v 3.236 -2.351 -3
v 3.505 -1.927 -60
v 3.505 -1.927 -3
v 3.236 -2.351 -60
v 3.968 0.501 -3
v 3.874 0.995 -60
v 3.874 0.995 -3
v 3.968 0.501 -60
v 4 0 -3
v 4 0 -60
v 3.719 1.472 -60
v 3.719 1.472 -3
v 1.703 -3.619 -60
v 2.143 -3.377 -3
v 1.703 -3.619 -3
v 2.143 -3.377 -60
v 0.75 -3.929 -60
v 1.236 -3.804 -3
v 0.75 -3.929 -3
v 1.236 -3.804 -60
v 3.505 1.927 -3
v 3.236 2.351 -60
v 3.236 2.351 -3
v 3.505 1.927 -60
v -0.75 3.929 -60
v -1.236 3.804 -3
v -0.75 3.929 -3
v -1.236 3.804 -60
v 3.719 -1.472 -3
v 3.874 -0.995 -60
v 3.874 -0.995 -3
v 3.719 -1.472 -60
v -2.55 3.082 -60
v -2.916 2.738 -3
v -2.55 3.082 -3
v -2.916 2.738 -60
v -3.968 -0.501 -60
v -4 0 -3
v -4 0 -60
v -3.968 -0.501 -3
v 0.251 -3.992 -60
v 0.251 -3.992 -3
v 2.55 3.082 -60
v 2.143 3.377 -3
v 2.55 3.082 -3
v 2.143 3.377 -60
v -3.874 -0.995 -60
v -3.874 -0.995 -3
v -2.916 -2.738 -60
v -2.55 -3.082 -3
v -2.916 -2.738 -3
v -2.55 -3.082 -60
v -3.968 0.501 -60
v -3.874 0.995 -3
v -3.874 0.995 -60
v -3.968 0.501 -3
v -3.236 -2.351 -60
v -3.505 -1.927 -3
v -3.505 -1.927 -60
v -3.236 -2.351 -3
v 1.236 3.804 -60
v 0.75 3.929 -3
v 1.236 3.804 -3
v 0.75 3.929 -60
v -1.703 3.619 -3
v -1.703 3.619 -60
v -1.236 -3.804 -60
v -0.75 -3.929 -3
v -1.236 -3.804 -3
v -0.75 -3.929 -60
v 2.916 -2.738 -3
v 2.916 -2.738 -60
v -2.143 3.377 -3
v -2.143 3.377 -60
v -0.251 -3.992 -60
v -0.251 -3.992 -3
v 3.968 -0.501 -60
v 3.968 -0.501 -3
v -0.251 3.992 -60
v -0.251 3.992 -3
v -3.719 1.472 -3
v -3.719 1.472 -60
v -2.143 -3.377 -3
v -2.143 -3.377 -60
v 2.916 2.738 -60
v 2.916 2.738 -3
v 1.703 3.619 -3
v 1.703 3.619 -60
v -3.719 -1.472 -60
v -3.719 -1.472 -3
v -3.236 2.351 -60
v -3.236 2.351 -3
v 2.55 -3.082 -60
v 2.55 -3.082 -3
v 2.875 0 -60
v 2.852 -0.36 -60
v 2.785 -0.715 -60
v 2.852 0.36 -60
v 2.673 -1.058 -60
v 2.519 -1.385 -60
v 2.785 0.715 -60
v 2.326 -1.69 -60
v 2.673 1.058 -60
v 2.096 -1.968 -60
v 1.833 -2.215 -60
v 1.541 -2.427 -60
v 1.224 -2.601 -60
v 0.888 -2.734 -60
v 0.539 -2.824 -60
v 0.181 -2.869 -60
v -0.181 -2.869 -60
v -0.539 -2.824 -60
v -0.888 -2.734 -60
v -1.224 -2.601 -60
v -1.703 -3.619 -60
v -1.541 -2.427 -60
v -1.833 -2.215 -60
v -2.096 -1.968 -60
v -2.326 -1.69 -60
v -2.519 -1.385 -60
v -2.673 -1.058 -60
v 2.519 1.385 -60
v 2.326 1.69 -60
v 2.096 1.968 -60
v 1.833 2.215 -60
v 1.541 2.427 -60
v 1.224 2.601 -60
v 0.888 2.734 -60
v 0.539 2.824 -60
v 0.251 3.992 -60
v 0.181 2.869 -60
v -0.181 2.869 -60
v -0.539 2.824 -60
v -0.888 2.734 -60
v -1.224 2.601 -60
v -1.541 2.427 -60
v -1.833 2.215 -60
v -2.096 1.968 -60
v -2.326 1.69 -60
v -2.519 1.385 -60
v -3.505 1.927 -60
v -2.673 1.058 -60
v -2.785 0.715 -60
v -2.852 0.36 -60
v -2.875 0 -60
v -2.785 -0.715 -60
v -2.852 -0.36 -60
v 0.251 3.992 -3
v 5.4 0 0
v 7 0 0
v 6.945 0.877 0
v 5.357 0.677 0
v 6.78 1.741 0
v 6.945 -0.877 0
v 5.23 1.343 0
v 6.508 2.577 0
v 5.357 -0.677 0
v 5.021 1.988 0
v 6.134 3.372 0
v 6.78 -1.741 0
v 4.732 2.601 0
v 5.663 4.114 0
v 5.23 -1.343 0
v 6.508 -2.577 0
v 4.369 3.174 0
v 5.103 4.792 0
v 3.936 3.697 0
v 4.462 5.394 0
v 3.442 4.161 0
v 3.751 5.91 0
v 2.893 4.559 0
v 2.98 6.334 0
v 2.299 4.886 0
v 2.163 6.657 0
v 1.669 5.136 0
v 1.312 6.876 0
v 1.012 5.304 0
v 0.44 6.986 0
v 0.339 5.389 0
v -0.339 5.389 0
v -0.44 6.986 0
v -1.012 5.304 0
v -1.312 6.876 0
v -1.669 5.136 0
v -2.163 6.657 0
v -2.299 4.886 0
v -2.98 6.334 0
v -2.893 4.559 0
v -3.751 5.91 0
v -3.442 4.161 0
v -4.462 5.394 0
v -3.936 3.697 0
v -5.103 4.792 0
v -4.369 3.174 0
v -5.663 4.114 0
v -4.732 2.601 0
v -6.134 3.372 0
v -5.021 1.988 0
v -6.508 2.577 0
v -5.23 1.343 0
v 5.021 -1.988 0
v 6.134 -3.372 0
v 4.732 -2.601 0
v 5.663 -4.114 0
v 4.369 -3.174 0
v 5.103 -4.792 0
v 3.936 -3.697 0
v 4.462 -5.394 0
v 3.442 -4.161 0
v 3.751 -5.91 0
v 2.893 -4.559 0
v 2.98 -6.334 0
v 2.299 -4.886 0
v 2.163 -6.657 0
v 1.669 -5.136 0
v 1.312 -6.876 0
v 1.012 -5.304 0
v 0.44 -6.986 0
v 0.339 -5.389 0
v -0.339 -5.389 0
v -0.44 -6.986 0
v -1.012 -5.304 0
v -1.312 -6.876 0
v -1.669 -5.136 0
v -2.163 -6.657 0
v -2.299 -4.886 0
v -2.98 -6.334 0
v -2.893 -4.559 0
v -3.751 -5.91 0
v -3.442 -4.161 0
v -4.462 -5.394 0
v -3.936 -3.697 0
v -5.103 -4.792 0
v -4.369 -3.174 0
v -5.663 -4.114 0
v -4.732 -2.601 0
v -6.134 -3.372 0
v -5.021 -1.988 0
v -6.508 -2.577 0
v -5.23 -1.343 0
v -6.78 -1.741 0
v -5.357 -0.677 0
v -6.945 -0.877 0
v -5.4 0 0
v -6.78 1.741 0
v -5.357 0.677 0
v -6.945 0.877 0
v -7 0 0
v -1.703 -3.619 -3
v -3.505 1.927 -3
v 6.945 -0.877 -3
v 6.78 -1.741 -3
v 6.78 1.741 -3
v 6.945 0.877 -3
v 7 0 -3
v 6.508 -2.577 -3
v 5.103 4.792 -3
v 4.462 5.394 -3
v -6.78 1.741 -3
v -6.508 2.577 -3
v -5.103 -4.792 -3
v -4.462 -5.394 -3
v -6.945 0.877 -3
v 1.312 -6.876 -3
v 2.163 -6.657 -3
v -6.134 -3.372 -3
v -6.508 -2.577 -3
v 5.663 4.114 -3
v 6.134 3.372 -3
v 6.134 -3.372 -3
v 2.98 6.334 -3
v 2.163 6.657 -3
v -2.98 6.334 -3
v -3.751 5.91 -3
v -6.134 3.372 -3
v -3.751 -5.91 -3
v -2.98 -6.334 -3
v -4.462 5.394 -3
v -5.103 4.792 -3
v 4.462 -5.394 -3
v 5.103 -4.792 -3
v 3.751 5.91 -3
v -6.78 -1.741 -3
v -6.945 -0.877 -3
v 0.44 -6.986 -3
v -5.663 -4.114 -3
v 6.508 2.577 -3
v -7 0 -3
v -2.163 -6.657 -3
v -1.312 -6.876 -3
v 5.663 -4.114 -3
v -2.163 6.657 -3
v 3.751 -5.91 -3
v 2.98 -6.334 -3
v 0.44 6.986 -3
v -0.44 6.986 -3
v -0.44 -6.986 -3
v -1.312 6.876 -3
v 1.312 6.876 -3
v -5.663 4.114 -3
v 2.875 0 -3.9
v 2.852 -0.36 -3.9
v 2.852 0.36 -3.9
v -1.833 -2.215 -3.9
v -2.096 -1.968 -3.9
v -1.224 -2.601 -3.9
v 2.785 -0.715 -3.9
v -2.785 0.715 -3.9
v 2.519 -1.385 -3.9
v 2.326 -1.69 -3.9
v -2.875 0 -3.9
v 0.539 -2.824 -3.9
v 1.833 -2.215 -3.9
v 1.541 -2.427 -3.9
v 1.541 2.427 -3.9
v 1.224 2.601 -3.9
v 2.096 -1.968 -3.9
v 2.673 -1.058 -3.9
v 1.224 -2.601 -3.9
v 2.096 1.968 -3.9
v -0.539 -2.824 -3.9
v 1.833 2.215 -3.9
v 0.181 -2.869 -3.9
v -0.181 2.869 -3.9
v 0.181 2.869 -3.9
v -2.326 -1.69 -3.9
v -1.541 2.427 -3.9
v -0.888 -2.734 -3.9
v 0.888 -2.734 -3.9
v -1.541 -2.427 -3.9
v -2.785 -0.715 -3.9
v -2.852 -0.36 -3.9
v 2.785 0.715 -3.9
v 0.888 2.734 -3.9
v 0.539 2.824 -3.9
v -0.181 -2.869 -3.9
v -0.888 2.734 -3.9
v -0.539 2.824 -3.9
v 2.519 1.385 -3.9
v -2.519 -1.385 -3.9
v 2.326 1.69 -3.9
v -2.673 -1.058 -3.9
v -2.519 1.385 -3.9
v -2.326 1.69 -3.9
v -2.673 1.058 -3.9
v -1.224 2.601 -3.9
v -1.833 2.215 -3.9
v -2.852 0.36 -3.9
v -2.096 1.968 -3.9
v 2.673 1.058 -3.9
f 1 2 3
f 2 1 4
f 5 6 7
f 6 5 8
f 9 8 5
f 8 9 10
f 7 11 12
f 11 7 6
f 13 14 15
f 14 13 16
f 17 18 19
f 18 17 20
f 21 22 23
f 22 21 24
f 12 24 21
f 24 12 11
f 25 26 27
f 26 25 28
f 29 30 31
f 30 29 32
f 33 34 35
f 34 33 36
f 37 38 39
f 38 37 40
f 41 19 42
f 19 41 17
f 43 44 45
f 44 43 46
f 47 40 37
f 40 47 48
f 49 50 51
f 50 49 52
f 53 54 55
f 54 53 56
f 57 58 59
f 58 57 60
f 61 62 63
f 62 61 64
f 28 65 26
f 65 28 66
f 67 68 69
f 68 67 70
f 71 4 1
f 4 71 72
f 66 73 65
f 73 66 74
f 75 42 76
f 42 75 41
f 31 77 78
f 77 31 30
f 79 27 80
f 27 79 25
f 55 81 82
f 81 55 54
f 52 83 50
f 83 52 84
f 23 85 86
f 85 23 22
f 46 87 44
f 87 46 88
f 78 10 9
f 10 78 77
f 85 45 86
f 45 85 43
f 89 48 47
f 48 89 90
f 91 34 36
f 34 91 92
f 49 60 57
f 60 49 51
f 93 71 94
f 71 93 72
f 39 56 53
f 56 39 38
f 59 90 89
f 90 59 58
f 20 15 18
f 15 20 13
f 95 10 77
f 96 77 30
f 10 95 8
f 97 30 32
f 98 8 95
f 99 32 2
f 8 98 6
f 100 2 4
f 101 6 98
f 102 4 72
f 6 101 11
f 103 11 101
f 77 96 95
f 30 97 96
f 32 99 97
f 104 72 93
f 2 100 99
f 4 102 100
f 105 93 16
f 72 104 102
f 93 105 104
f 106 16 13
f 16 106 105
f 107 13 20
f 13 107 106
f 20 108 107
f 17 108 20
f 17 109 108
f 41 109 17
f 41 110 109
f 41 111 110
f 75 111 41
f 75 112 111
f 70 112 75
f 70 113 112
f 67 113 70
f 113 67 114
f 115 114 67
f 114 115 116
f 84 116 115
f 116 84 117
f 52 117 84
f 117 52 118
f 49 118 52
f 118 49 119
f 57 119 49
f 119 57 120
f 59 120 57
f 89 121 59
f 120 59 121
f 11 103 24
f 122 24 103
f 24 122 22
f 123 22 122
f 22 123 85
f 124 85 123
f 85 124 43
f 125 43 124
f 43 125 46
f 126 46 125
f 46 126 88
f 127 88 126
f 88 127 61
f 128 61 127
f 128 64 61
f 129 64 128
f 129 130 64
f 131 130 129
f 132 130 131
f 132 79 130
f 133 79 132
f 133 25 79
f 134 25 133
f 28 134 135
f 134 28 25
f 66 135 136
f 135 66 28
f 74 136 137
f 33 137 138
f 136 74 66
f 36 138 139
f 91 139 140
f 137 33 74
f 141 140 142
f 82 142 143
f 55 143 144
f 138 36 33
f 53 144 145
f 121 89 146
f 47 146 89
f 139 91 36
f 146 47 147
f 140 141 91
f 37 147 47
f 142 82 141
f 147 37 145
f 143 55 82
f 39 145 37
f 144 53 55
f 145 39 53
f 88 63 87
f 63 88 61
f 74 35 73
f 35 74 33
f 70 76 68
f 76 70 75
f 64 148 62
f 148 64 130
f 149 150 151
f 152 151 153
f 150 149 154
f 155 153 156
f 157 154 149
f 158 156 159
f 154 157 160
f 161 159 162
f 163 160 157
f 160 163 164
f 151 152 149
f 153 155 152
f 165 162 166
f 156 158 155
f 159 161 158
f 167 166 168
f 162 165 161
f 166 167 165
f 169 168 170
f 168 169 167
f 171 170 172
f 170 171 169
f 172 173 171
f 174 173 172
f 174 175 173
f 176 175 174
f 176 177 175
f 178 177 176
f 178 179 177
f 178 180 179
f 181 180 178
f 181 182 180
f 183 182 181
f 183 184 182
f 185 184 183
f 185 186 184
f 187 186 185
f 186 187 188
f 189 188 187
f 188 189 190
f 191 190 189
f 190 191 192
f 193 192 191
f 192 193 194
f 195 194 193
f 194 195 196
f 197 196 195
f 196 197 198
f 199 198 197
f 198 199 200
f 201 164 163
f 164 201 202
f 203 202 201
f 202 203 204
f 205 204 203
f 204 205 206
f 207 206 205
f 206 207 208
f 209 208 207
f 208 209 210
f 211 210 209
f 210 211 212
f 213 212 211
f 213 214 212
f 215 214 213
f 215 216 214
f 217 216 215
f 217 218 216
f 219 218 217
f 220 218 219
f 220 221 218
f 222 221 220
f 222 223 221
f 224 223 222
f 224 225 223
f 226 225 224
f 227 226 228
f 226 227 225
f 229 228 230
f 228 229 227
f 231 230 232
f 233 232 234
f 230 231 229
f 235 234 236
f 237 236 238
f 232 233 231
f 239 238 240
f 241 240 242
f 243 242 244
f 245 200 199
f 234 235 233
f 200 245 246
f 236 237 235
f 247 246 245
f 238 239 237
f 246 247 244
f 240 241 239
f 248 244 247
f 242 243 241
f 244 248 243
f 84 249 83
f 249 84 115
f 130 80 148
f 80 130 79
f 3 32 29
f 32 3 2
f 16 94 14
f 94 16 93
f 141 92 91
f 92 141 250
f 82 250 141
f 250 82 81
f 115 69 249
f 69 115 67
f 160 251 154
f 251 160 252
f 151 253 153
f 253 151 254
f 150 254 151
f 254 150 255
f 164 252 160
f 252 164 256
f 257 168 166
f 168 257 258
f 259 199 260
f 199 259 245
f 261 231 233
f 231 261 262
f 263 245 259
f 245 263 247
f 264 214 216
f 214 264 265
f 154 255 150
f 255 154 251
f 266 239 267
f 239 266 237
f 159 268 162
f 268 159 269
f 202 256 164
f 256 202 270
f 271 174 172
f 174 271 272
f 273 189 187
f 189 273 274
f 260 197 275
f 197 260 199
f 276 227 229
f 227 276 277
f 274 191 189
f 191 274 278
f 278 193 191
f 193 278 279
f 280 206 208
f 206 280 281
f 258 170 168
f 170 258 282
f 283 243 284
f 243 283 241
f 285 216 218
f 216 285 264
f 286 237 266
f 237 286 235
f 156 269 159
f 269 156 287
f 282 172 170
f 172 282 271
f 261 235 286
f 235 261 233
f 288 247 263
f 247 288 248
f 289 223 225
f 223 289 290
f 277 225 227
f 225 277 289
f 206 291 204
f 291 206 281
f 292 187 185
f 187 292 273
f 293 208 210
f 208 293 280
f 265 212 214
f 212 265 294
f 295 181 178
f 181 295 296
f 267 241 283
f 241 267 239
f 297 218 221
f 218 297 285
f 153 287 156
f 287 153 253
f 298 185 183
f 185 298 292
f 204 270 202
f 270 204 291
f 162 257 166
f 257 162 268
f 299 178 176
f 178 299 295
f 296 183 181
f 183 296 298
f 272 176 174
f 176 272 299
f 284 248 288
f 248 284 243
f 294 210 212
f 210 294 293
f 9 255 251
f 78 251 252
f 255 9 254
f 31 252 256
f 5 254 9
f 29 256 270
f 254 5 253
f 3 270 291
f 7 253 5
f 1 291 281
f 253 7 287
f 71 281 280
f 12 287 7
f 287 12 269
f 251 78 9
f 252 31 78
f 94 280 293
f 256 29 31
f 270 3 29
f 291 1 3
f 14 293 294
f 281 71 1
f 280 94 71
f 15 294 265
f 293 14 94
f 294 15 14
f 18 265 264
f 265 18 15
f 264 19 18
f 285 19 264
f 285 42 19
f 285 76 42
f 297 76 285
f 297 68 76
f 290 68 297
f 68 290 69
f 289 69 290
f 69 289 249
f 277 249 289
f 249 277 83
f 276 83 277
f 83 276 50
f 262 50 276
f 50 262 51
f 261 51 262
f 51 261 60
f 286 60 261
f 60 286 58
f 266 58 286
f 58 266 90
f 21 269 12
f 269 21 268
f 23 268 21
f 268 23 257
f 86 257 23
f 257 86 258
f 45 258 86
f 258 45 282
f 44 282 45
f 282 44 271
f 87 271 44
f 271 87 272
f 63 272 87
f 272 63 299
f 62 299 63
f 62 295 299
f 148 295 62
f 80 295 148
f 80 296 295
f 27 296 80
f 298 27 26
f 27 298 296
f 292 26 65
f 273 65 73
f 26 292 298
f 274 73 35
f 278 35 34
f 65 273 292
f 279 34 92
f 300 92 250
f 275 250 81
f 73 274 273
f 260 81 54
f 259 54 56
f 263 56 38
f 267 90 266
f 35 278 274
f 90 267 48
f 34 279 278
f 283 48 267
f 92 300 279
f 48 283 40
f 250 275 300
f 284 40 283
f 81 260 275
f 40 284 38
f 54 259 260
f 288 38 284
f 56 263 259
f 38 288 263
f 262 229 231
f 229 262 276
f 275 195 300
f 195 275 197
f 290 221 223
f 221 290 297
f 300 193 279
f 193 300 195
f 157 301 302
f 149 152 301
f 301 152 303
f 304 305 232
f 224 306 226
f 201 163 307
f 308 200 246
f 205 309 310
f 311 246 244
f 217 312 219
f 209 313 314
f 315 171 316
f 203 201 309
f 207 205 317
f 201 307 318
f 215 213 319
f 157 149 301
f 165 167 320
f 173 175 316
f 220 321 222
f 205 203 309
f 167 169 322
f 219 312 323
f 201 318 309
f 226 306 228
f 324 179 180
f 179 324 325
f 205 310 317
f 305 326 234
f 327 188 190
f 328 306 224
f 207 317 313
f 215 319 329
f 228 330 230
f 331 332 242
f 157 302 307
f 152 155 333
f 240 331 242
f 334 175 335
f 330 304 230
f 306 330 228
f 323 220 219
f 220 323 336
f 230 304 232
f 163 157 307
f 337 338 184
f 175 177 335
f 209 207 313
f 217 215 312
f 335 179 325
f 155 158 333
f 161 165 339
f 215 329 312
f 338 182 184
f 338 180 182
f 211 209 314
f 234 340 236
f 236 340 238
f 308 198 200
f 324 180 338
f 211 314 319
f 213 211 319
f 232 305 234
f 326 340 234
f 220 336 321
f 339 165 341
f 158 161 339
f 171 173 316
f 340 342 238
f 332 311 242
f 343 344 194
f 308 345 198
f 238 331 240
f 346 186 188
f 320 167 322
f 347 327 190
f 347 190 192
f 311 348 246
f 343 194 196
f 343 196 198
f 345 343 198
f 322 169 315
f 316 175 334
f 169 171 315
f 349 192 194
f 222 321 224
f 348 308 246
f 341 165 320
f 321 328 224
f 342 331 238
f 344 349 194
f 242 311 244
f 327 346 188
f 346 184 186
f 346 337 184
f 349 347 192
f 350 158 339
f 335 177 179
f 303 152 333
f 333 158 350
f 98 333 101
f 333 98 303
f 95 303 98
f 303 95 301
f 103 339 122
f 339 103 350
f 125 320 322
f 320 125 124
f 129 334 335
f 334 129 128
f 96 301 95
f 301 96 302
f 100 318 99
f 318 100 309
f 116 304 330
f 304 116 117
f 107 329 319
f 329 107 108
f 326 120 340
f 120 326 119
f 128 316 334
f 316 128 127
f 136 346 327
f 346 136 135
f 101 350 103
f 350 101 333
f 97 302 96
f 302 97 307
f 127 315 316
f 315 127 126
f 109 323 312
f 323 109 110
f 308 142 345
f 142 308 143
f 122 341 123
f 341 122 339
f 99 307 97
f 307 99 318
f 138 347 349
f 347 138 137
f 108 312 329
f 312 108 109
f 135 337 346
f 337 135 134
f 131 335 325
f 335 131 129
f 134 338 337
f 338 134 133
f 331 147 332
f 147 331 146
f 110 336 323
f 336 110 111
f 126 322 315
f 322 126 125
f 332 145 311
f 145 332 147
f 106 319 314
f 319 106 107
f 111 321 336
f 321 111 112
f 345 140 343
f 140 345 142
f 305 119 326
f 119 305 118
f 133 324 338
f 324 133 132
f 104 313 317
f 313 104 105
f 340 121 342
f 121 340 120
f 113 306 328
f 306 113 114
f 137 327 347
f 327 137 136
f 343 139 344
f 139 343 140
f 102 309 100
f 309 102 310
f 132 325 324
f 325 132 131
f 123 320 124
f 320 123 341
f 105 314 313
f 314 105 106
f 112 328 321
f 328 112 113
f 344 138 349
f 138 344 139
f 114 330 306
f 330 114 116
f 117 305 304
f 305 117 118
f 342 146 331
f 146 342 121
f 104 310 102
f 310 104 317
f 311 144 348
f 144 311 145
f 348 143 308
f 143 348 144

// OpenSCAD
$fn = 50;


difference() {
	union() {
		translate(v = [0, 0, -60.0000000000]) {
			cylinder(h = 60, r = 4.0000000000);
		}
		translate(v = [0, 0, -3.0000000000]) {
			cylinder(h = 3, r = 7.0000000000);
		}
	}
	union() {
		translate(v = [0, 0, 0]) {
			rotate(a = [0, 0, 0]) {
				difference() {
					union() {
						#translate(v = [0, 0, -60.0000000000]) {
							cylinder(h = 60, r = 2.6000000000);
						}
						#translate(v = [0, 0, -3.9000000000]) {
							cylinder(h = 3.9000000000, r = 4.0000000000, r1 = 2.8750000000, r2 = 5.4000000000);
						}
						#translate(v = [0, 0, -60.0000000000]) {
							cylinder(h = 60, r = 2.8750000000);
						}
						#translate(v = [0, 0, -60.0000000000]) {
							cylinder(h = 60, r = 2.6000000000);
						}
					}
					union();
				}
			}
		}
	}
}
